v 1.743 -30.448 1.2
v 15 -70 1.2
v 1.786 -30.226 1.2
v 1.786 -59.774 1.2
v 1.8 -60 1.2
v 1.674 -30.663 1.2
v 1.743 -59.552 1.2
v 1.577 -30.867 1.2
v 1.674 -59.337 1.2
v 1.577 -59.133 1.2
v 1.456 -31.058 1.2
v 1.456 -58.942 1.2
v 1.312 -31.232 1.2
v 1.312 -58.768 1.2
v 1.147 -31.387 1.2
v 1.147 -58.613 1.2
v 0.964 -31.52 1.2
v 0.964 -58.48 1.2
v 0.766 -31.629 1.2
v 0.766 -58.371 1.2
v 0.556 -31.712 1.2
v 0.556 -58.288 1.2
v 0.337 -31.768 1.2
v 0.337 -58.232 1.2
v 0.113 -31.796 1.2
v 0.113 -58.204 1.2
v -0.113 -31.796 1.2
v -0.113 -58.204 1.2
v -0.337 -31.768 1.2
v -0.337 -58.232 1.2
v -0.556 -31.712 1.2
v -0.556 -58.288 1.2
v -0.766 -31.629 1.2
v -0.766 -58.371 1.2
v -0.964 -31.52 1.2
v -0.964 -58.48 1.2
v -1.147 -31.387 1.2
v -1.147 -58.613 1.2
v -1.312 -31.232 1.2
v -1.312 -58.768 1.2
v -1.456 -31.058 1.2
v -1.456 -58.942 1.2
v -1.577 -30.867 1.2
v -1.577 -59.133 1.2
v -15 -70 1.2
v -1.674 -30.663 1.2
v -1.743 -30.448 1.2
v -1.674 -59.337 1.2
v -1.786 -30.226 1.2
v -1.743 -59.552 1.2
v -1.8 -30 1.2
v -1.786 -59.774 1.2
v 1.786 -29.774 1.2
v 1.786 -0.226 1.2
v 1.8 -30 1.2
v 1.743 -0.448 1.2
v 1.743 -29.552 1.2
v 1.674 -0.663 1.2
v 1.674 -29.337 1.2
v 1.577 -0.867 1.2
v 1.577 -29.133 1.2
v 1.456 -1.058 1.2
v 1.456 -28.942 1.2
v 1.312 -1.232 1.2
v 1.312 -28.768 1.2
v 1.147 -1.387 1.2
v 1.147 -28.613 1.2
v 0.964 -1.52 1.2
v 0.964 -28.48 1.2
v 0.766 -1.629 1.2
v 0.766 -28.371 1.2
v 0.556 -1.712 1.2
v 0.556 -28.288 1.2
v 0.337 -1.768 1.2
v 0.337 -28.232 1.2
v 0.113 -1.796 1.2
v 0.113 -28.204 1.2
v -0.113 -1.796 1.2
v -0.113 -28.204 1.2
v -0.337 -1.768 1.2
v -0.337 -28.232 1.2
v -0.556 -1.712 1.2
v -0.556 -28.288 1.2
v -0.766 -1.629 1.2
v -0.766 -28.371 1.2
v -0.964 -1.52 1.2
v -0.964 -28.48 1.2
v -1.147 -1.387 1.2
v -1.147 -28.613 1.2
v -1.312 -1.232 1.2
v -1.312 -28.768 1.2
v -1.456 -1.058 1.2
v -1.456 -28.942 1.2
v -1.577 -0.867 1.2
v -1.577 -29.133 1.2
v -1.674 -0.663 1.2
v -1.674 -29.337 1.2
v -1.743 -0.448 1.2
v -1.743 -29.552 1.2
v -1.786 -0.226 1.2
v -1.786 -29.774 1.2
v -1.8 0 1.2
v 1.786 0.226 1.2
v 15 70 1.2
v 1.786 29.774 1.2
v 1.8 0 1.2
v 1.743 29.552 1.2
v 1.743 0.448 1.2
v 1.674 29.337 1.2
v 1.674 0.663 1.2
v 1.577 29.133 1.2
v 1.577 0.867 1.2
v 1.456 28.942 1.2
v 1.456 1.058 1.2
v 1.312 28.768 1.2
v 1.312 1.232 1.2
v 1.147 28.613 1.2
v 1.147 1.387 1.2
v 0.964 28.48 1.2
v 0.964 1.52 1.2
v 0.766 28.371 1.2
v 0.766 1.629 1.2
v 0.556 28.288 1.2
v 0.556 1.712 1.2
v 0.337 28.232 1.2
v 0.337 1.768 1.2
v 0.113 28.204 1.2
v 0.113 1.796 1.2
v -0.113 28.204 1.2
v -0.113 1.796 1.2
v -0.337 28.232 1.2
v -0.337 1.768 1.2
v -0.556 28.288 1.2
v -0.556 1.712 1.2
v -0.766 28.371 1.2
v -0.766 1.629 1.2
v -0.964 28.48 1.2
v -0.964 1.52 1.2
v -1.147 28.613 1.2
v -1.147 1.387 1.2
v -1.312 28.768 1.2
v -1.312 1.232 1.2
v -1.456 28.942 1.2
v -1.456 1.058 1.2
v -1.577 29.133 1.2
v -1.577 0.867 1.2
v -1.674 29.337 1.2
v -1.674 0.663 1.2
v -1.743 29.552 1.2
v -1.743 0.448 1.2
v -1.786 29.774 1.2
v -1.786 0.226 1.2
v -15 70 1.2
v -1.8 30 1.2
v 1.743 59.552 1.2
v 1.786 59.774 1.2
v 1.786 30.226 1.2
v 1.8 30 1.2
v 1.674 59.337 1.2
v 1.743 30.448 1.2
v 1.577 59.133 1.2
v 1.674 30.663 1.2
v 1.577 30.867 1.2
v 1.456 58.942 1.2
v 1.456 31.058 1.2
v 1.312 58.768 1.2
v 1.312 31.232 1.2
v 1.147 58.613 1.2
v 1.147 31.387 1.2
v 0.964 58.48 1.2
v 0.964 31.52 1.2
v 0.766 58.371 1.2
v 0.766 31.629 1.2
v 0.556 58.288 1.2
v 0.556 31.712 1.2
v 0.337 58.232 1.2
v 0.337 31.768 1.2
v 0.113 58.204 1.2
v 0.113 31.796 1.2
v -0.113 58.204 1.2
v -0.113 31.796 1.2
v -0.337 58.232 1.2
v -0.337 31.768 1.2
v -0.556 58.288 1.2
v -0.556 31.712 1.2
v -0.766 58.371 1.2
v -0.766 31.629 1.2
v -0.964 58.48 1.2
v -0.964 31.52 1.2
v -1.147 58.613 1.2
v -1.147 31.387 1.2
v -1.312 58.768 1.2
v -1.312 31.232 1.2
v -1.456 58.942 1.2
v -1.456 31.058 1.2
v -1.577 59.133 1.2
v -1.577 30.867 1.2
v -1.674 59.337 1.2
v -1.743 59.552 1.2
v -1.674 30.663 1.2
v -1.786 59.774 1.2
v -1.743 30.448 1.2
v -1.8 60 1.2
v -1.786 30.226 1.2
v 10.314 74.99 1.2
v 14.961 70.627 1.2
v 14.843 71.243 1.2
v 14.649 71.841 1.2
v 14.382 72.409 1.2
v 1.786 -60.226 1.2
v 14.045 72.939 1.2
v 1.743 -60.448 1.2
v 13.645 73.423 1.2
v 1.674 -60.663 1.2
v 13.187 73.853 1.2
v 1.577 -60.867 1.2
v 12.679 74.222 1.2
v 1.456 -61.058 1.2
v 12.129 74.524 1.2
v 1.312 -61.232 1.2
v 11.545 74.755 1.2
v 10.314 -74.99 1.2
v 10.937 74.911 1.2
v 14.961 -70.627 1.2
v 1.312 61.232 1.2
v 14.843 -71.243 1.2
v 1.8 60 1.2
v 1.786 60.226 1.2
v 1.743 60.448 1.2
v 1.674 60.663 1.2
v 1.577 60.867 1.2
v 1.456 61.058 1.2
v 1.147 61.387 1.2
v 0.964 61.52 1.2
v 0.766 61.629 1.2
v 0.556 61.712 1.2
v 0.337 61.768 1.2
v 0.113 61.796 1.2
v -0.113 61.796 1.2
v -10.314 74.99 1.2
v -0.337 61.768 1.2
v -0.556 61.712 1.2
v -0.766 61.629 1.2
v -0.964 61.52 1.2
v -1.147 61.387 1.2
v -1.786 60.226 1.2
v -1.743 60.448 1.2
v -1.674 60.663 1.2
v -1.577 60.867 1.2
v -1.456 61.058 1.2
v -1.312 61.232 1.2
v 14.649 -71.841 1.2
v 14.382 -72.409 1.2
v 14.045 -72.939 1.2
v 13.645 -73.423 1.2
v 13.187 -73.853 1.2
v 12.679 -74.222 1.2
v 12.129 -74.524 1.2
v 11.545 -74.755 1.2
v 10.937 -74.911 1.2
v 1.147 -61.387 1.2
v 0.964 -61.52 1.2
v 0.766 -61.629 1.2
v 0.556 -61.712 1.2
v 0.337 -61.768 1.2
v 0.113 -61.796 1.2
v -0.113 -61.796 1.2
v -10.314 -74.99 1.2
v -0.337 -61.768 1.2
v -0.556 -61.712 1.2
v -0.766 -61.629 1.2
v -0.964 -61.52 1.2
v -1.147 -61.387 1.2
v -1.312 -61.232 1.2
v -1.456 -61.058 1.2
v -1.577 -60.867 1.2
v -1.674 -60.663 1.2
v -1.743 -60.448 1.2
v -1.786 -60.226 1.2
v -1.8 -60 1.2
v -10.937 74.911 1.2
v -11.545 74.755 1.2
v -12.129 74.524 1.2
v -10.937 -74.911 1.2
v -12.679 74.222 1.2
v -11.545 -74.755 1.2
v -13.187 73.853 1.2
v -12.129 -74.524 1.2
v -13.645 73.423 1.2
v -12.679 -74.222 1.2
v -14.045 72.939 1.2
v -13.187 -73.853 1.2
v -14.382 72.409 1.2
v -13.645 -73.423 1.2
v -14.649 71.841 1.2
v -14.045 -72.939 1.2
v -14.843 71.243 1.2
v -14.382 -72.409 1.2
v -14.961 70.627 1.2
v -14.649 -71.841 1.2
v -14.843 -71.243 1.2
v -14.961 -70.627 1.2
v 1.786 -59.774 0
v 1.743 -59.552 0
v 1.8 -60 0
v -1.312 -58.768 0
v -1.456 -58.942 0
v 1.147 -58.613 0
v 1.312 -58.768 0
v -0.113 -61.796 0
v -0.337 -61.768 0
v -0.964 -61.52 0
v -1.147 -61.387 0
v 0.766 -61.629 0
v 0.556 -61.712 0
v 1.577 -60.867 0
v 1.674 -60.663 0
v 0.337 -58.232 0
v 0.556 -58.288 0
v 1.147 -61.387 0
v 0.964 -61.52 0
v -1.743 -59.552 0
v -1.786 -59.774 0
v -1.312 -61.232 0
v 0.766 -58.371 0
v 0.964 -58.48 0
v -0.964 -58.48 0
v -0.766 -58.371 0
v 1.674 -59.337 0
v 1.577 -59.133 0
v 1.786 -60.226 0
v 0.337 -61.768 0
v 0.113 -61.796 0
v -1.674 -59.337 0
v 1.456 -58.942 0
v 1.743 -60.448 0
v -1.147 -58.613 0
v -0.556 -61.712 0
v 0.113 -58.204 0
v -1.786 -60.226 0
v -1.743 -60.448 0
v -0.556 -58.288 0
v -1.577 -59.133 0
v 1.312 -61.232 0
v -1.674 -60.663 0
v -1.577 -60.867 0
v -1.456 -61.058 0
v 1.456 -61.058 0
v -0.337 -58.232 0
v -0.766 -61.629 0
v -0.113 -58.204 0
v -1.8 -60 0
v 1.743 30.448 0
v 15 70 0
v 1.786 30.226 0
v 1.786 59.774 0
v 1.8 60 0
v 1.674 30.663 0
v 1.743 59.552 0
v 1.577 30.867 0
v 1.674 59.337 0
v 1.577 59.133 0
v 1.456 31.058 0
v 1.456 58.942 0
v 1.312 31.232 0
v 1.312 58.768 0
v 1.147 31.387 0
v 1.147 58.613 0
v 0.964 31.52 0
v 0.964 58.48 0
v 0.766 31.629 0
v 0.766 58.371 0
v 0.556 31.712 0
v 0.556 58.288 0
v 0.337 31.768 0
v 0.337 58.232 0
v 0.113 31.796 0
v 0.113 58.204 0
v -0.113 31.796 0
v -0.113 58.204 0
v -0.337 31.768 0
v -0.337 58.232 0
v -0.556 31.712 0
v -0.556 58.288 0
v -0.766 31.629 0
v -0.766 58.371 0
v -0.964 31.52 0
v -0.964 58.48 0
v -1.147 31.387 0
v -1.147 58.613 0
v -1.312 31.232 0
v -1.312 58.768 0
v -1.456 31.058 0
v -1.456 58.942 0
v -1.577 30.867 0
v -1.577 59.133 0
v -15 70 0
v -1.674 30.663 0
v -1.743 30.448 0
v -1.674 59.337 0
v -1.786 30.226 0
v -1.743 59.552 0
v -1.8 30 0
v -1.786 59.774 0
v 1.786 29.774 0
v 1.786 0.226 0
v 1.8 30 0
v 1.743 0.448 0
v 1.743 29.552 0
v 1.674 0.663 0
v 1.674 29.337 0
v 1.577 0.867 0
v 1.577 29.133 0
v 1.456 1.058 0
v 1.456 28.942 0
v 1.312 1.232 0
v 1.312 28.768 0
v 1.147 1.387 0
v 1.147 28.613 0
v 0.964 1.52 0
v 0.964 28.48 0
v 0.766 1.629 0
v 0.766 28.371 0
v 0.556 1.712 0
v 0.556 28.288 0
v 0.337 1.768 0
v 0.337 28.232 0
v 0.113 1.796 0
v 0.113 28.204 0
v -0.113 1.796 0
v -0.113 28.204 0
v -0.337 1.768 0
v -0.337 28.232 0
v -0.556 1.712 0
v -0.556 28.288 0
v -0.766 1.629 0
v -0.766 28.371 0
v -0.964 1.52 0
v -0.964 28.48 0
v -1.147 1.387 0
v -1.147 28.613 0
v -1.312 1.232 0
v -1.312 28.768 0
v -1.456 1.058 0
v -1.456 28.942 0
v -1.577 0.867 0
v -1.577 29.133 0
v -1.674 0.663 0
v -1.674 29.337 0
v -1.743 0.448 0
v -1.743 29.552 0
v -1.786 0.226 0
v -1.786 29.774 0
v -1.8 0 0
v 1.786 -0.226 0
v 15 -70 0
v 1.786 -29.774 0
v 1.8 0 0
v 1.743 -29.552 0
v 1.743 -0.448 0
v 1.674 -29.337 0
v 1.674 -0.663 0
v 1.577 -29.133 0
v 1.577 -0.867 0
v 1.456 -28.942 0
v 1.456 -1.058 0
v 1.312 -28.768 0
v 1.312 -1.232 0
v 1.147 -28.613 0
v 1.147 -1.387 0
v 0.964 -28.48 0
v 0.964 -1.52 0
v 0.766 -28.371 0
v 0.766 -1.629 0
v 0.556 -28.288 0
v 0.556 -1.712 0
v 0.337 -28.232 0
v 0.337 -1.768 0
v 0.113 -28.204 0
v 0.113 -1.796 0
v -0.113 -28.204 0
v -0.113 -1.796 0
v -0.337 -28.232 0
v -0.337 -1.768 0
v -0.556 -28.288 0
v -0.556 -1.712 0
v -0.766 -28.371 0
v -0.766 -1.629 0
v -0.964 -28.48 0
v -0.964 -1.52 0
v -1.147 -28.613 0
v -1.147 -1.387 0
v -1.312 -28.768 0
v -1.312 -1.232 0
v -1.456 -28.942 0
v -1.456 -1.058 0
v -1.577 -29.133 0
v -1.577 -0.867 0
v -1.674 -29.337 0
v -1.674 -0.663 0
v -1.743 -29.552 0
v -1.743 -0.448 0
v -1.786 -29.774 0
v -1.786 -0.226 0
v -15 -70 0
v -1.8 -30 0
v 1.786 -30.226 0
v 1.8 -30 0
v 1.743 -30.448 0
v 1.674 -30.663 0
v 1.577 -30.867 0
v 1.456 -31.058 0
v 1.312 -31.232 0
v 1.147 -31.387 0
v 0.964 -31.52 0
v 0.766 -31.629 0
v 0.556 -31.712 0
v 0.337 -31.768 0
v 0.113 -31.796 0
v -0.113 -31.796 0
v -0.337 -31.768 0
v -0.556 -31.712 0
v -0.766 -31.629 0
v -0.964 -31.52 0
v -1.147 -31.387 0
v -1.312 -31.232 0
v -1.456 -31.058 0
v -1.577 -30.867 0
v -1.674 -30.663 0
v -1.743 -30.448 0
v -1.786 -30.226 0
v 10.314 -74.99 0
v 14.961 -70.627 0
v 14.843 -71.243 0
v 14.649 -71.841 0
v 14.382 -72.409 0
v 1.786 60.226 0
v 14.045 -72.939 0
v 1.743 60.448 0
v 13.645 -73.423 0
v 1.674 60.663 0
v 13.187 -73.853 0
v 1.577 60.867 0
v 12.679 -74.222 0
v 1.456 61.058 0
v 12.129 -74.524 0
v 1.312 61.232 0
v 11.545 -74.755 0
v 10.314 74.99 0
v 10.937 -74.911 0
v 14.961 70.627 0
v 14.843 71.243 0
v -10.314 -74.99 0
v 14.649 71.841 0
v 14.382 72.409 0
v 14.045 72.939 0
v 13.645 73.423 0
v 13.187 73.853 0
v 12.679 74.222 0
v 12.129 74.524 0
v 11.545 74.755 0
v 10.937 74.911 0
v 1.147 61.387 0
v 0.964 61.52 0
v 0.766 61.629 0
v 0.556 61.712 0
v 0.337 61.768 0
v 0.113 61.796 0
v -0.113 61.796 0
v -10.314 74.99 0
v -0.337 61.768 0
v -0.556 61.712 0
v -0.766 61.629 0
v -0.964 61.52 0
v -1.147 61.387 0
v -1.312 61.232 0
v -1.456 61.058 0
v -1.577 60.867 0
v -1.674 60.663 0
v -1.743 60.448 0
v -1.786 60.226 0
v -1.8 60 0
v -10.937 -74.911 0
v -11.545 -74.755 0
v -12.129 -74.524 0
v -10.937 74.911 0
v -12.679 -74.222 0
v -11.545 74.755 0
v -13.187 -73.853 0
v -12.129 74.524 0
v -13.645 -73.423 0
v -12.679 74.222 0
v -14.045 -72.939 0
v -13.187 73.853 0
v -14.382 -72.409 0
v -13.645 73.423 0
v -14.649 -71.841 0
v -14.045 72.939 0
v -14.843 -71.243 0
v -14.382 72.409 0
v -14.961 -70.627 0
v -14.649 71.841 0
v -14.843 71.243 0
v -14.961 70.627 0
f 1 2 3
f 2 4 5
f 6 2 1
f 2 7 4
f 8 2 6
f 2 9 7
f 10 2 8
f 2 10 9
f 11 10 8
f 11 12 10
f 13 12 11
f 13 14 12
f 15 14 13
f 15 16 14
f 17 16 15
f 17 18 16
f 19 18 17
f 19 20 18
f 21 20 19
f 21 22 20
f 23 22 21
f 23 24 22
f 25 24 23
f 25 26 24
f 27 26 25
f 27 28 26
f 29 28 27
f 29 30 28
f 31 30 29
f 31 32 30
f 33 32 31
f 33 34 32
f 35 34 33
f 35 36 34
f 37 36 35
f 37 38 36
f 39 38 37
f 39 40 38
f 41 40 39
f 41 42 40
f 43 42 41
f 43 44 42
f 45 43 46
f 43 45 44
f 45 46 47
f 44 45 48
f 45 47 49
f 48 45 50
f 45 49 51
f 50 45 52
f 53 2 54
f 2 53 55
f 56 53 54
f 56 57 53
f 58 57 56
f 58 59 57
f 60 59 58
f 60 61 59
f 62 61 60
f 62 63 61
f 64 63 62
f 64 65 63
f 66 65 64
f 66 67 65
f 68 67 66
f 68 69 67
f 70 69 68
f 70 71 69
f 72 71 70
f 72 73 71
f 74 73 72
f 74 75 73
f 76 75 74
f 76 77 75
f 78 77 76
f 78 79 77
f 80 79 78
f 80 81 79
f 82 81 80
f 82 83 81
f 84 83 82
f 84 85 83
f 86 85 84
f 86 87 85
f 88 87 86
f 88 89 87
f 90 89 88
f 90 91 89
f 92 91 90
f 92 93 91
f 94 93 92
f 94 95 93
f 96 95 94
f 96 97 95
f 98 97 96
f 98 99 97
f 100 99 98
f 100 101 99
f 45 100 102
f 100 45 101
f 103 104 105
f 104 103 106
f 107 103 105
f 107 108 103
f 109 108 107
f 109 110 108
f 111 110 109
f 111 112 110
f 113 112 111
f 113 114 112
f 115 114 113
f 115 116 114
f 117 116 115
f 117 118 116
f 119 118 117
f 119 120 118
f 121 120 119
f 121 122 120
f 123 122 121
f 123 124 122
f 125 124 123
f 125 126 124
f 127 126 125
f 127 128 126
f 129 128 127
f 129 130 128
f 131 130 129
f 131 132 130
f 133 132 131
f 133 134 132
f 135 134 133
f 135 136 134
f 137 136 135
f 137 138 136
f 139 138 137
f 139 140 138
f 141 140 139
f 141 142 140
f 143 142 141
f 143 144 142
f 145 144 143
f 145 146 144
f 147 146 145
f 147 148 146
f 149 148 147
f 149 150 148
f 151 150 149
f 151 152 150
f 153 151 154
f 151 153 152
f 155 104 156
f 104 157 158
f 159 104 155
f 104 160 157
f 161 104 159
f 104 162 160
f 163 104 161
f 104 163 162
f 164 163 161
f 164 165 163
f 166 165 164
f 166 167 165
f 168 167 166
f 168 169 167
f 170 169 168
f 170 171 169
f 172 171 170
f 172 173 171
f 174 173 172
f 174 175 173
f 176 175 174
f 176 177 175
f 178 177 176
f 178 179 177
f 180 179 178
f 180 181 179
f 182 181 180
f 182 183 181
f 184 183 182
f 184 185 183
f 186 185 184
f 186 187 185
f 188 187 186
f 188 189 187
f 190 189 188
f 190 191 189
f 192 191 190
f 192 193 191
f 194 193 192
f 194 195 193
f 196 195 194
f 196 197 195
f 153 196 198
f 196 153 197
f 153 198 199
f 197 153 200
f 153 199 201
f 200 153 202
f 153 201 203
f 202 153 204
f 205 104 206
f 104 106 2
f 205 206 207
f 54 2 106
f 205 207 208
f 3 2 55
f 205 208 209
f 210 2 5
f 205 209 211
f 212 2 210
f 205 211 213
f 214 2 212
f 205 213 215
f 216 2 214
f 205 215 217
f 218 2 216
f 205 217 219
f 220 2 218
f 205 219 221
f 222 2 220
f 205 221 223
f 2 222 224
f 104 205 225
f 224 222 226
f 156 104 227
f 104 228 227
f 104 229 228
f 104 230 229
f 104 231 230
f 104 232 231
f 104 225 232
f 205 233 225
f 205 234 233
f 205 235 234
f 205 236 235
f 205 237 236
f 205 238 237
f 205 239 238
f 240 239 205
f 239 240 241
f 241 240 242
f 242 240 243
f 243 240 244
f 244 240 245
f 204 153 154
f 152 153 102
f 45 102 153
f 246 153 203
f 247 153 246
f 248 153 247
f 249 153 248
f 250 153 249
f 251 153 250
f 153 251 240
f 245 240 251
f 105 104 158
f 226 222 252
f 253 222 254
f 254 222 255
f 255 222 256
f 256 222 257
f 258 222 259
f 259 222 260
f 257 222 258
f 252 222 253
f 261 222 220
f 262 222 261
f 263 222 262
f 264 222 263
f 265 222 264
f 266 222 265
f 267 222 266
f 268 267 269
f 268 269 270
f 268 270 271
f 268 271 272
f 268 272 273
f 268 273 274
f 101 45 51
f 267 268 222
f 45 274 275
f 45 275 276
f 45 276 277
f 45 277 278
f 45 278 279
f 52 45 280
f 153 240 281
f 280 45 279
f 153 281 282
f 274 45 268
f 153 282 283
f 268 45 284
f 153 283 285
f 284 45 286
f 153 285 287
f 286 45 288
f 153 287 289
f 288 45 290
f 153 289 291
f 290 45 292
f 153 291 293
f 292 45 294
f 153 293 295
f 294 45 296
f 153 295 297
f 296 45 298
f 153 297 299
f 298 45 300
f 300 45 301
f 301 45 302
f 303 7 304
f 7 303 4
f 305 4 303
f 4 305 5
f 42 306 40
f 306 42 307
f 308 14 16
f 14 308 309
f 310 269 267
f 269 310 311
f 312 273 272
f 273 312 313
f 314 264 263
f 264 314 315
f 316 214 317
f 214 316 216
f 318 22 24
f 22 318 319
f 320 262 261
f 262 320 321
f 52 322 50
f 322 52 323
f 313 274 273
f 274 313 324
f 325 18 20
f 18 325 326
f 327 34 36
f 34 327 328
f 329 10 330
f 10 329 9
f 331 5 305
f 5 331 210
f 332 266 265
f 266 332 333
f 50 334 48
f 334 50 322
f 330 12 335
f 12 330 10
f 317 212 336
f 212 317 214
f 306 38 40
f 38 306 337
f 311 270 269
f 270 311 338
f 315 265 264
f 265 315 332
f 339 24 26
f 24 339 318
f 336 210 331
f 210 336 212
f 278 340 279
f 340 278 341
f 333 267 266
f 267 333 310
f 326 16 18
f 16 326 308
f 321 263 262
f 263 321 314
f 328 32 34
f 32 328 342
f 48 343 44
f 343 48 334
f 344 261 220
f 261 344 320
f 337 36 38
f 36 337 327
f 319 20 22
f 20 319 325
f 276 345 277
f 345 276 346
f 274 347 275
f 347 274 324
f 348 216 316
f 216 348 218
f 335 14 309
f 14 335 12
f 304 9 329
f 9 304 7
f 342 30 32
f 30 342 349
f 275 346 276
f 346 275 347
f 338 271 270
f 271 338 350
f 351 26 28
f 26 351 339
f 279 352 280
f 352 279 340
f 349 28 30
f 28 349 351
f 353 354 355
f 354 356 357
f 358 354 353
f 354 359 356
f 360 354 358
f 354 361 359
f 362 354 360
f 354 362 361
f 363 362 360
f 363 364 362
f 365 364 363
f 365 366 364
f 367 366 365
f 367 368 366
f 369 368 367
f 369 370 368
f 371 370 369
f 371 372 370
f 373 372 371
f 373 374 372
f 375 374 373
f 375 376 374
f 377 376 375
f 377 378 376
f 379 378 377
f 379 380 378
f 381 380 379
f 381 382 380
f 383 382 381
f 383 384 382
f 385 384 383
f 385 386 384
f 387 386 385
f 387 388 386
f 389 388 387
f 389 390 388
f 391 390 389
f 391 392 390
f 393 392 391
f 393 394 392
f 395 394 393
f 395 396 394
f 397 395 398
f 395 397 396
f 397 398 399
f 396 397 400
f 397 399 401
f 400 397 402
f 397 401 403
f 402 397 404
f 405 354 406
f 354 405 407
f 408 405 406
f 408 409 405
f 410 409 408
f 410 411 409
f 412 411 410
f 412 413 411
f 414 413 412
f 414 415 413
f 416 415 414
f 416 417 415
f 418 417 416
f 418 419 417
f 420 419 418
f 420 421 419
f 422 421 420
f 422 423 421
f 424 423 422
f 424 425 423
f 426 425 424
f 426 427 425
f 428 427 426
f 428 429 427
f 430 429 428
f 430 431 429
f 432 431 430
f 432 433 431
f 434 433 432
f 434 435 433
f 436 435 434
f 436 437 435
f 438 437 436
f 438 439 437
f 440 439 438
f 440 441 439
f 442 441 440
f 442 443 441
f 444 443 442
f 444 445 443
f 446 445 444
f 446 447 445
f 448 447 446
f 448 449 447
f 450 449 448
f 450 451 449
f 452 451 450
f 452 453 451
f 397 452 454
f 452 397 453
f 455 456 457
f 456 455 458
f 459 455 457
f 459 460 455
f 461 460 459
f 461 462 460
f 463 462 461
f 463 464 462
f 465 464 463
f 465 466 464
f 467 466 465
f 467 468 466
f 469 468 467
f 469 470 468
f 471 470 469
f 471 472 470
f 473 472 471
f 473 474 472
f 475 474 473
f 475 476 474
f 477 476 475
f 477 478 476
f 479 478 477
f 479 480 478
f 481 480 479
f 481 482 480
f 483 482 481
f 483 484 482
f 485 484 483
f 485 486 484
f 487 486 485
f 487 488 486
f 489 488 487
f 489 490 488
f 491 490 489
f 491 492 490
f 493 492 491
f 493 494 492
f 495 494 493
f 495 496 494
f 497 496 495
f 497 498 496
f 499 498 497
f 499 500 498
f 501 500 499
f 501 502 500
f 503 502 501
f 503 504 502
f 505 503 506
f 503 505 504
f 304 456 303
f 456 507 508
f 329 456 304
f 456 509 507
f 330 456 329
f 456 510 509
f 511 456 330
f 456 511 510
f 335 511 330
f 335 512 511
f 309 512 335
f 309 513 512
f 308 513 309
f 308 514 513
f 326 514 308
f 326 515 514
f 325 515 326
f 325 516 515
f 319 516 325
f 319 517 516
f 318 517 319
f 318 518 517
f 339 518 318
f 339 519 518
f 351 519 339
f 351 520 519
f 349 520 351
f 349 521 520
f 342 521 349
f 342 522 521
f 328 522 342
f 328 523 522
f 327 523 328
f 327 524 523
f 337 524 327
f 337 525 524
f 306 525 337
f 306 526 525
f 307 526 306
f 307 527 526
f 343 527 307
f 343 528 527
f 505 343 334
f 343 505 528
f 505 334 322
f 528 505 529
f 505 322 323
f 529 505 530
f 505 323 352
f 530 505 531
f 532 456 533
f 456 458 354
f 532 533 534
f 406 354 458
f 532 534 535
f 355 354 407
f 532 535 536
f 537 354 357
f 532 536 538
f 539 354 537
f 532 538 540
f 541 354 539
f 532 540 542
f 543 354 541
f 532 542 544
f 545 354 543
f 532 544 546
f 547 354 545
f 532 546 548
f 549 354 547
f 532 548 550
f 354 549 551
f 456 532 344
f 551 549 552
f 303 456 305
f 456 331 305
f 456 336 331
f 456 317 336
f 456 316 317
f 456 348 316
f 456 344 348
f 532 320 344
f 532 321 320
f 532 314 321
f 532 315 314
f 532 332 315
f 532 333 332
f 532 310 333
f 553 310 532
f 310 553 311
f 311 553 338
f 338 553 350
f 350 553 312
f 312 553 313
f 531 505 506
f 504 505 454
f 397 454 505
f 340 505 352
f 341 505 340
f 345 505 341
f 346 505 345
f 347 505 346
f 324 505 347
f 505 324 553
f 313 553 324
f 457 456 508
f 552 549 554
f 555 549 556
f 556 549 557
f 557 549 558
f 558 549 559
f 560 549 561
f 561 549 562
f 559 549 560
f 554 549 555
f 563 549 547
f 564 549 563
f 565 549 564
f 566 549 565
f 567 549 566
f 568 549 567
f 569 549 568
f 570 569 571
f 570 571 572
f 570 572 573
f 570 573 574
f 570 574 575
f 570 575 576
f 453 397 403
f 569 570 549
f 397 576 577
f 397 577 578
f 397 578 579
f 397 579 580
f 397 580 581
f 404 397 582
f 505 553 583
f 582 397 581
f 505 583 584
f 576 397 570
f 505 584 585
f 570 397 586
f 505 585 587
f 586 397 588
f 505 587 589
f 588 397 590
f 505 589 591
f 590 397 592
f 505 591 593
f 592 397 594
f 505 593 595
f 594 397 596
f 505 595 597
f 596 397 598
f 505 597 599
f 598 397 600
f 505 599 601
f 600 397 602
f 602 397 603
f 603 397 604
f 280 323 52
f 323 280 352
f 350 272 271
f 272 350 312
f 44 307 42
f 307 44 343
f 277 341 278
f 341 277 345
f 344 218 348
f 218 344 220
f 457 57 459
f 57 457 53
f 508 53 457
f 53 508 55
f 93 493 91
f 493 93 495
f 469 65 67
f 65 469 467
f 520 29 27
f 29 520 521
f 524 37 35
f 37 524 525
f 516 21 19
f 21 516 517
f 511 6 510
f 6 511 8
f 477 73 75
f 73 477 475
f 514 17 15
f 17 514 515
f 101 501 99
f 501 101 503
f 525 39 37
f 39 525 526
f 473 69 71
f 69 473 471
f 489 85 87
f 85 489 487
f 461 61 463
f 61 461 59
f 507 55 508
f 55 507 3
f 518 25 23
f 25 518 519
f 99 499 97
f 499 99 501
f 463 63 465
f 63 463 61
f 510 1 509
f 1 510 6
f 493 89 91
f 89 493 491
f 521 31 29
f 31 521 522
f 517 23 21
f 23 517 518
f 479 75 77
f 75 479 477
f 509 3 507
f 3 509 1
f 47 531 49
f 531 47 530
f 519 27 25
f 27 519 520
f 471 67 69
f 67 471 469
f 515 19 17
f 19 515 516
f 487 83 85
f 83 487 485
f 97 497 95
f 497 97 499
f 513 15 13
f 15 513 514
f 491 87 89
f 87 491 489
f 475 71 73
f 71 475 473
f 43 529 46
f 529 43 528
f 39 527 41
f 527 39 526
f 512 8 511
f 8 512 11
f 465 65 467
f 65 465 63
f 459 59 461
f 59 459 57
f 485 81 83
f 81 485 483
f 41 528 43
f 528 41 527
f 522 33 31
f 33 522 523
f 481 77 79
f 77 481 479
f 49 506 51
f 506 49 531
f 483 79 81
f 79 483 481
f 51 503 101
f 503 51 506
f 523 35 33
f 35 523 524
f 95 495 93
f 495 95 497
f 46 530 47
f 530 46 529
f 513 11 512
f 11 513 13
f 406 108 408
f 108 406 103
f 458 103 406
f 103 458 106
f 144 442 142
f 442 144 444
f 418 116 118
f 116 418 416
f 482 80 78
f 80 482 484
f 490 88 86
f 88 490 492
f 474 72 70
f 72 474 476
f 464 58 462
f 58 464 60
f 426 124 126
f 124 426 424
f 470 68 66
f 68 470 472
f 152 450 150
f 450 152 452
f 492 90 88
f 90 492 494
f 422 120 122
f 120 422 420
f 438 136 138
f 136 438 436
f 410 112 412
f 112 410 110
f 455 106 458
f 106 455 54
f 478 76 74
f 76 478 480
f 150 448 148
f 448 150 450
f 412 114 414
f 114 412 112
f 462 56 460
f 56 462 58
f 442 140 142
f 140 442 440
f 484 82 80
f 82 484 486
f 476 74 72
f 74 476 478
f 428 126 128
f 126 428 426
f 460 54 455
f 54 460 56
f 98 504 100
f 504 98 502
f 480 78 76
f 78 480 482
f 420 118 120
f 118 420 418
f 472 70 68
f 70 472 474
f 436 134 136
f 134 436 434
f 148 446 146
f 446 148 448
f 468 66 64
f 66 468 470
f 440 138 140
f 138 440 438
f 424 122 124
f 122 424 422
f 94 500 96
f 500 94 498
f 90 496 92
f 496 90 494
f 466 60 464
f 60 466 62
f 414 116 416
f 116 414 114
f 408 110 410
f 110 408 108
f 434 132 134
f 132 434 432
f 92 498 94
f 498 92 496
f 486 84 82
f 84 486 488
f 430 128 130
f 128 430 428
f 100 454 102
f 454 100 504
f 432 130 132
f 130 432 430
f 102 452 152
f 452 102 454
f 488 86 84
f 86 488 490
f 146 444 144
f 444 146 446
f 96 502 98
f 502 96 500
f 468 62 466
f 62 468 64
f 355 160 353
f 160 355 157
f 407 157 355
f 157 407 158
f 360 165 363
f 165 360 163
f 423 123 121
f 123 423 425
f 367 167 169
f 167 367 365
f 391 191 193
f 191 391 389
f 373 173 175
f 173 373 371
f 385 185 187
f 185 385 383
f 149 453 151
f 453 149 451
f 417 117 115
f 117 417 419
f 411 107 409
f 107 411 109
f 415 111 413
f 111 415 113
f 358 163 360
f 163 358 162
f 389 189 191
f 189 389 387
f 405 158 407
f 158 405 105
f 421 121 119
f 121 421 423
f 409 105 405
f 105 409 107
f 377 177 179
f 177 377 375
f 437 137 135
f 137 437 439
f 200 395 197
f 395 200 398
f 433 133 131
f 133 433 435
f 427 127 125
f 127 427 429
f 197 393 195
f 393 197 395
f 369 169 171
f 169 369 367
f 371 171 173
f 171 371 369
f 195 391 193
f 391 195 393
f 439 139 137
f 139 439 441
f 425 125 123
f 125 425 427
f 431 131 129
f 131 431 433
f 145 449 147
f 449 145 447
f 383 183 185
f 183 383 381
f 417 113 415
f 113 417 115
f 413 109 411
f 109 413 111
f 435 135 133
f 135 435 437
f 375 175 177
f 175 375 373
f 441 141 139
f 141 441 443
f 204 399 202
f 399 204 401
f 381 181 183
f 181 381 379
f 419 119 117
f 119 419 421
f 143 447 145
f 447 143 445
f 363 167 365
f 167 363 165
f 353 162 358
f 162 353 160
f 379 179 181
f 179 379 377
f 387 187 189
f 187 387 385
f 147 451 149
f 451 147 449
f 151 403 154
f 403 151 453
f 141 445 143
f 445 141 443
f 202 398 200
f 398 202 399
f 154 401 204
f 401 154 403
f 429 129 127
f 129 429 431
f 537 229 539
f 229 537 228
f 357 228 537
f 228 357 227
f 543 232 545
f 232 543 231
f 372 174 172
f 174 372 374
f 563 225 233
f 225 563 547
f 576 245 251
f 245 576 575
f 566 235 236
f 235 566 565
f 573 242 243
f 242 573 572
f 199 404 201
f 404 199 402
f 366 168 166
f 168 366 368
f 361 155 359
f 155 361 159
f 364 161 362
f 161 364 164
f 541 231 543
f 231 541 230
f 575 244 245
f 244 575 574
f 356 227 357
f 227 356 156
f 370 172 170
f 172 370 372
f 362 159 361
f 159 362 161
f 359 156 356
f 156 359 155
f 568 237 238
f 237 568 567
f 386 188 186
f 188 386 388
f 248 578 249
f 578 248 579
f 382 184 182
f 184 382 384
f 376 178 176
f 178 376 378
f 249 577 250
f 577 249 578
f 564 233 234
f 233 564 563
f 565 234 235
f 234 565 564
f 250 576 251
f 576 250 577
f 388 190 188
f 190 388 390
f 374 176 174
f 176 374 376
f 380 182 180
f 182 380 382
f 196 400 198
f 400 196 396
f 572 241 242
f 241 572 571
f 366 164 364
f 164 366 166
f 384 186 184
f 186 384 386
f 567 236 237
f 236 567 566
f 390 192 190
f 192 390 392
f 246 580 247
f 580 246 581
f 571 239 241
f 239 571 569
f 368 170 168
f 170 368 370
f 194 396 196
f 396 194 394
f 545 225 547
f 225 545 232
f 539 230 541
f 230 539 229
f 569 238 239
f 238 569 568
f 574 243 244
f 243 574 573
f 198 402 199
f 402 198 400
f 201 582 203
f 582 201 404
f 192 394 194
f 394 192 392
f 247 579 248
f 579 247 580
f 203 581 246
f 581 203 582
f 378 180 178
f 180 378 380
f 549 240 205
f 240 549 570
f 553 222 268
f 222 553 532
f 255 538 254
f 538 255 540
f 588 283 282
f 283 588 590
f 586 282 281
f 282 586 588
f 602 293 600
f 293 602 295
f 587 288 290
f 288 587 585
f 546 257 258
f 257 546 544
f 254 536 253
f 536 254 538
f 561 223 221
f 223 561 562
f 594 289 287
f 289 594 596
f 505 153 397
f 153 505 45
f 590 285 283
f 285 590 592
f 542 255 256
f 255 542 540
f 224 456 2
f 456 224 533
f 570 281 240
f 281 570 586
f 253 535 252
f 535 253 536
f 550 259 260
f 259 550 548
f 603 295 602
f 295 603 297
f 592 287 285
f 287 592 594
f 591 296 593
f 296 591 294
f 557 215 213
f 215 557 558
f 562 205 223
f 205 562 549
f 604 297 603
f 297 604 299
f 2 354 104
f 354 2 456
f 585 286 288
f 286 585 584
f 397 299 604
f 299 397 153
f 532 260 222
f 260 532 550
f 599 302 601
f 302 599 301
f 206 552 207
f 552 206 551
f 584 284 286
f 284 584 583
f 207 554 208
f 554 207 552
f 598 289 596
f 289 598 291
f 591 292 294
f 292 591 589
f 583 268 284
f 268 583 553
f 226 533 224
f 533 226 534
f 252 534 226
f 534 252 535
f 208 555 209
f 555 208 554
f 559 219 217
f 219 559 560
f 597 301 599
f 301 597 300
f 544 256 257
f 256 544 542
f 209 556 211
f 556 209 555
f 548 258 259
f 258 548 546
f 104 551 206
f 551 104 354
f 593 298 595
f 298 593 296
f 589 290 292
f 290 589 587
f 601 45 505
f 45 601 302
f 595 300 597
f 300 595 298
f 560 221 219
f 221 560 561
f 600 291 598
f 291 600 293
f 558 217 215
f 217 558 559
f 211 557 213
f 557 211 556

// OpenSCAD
$fn = 50;


difference() {
	union() {
		hull() {
			translate(v = [-10.0000000000, 70.0000000000, 0]) {
				cylinder(h = 90, r = 5);
			}
			translate(v = [10.0000000000, 70.0000000000, 0]) {
				cylinder(h = 90, r = 5);
			}
			translate(v = [-10.0000000000, -70.0000000000, 0]) {
				cylinder(h = 90, r = 5);
			}
			translate(v = [10.0000000000, -70.0000000000, 0]) {
				cylinder(h = 90, r = 5);
			}
		}
	}
	union() {
		translate(v = [0, 0, 1.2000000000]) {
			hull() {
				translate(v = [-10.0000000000, 70.0000000000, 0]) {
					cylinder(h = 88.8000000000, r = 3.8000000000);
				}
				translate(v = [10.0000000000, 70.0000000000, 0]) {
					cylinder(h = 88.8000000000, r = 3.8000000000);
				}
				translate(v = [-10.0000000000, -70.0000000000, 0]) {
					cylinder(h = 88.8000000000, r = 3.8000000000);
				}
				translate(v = [10.0000000000, -70.0000000000, 0]) {
					cylinder(h = 88.8000000000, r = 3.8000000000);
				}
			}
		}
		#translate(v = [0.0000000000, -60.0000000000, 0]) {
			cylinder(h = 1.2000000000, r = 1.8000000000);
		}
		#translate(v = [0.0000000000, -30.0000000000, 0]) {
			cylinder(h = 1.2000000000, r = 1.8000000000);
		}
		#cylinder(h = 1.2000000000, r = 1.8000000000);
		#translate(v = [0.0000000000, 30.0000000000, 0]) {
			cylinder(h = 1.2000000000, r = 1.8000000000);
		}
		#translate(v = [0.0000000000, 60.0000000000, 0]) {
			cylinder(h = 1.2000000000, r = 1.8000000000);
		}
		translate(v = [-250.0000000000, -250.0000000000, 1.2000000000]) {
			cube(size = [500, 500, 500]);
		}
		translate(v = [-250.0000000000, -250.0000000000, 1.2000000000]) {
			cube(size = [500, 500, 500]);
		}
		translate(v = [-250.0000000000, -250.0000000000, 1.2000000000]) {
			cube(size = [500, 500, 500]);
		}
	}
}
